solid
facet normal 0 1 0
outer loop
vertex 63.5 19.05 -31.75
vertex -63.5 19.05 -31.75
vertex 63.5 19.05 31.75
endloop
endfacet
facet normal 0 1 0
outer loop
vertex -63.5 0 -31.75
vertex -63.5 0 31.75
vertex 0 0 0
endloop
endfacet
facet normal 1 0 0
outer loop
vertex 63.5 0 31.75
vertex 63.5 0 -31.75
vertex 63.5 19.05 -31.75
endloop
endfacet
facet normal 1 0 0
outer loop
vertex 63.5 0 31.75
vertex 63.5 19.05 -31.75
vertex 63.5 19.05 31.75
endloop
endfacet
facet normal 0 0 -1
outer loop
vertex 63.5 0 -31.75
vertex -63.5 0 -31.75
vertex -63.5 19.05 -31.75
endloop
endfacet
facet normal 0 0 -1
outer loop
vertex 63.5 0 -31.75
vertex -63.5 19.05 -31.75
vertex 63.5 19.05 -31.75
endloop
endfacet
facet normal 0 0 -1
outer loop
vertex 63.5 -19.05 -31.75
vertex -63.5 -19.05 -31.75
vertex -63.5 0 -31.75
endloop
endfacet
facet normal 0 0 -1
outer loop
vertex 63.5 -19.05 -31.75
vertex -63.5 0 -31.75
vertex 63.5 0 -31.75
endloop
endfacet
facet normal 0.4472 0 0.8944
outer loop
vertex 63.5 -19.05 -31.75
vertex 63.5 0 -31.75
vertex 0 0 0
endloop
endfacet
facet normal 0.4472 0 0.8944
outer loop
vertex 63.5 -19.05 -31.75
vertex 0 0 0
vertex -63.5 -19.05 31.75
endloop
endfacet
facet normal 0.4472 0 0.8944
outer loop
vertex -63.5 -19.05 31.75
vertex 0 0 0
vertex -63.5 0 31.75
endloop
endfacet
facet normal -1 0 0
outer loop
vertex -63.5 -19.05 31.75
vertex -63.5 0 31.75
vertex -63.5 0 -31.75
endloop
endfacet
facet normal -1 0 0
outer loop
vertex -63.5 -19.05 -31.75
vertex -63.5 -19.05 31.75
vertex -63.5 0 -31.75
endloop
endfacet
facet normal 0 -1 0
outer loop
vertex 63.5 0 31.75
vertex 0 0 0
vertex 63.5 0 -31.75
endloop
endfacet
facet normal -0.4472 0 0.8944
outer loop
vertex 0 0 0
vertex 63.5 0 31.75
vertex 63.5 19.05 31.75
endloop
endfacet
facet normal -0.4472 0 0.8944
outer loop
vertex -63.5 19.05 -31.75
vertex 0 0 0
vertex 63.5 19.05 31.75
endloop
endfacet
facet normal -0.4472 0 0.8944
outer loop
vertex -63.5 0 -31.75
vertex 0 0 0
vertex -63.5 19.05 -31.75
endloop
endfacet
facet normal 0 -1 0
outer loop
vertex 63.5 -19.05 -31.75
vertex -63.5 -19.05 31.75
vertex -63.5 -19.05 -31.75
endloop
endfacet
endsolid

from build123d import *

# Parameters (mm, degrees)
F1_DEPTH = 19.05
F2_DEPTH = 19.05


with BuildPart() as f1:
    # F0 (on Front) → F1 (new body)
    with BuildSketch(Plane.XZ):
        Polygon((-63.5, 31.75), (-63.5, -31.75), (0, 0), align=None)
        Polygon((-63.5, -31.75), (63.5, -31.75), (0, 0), align=None)
    extrude(amount=F1_DEPTH)

    # F0 (on Front) → F2 (join)
    with BuildSketch(Plane.XZ):
        Polygon((0, 0), (63.5, -31.75), (63.5, 31.75), align=None)
        Polygon((-63.5, -31.75), (63.5, -31.75), (0, 0), align=None)
    extrude(amount=-F2_DEPTH)


solid = f1.part
